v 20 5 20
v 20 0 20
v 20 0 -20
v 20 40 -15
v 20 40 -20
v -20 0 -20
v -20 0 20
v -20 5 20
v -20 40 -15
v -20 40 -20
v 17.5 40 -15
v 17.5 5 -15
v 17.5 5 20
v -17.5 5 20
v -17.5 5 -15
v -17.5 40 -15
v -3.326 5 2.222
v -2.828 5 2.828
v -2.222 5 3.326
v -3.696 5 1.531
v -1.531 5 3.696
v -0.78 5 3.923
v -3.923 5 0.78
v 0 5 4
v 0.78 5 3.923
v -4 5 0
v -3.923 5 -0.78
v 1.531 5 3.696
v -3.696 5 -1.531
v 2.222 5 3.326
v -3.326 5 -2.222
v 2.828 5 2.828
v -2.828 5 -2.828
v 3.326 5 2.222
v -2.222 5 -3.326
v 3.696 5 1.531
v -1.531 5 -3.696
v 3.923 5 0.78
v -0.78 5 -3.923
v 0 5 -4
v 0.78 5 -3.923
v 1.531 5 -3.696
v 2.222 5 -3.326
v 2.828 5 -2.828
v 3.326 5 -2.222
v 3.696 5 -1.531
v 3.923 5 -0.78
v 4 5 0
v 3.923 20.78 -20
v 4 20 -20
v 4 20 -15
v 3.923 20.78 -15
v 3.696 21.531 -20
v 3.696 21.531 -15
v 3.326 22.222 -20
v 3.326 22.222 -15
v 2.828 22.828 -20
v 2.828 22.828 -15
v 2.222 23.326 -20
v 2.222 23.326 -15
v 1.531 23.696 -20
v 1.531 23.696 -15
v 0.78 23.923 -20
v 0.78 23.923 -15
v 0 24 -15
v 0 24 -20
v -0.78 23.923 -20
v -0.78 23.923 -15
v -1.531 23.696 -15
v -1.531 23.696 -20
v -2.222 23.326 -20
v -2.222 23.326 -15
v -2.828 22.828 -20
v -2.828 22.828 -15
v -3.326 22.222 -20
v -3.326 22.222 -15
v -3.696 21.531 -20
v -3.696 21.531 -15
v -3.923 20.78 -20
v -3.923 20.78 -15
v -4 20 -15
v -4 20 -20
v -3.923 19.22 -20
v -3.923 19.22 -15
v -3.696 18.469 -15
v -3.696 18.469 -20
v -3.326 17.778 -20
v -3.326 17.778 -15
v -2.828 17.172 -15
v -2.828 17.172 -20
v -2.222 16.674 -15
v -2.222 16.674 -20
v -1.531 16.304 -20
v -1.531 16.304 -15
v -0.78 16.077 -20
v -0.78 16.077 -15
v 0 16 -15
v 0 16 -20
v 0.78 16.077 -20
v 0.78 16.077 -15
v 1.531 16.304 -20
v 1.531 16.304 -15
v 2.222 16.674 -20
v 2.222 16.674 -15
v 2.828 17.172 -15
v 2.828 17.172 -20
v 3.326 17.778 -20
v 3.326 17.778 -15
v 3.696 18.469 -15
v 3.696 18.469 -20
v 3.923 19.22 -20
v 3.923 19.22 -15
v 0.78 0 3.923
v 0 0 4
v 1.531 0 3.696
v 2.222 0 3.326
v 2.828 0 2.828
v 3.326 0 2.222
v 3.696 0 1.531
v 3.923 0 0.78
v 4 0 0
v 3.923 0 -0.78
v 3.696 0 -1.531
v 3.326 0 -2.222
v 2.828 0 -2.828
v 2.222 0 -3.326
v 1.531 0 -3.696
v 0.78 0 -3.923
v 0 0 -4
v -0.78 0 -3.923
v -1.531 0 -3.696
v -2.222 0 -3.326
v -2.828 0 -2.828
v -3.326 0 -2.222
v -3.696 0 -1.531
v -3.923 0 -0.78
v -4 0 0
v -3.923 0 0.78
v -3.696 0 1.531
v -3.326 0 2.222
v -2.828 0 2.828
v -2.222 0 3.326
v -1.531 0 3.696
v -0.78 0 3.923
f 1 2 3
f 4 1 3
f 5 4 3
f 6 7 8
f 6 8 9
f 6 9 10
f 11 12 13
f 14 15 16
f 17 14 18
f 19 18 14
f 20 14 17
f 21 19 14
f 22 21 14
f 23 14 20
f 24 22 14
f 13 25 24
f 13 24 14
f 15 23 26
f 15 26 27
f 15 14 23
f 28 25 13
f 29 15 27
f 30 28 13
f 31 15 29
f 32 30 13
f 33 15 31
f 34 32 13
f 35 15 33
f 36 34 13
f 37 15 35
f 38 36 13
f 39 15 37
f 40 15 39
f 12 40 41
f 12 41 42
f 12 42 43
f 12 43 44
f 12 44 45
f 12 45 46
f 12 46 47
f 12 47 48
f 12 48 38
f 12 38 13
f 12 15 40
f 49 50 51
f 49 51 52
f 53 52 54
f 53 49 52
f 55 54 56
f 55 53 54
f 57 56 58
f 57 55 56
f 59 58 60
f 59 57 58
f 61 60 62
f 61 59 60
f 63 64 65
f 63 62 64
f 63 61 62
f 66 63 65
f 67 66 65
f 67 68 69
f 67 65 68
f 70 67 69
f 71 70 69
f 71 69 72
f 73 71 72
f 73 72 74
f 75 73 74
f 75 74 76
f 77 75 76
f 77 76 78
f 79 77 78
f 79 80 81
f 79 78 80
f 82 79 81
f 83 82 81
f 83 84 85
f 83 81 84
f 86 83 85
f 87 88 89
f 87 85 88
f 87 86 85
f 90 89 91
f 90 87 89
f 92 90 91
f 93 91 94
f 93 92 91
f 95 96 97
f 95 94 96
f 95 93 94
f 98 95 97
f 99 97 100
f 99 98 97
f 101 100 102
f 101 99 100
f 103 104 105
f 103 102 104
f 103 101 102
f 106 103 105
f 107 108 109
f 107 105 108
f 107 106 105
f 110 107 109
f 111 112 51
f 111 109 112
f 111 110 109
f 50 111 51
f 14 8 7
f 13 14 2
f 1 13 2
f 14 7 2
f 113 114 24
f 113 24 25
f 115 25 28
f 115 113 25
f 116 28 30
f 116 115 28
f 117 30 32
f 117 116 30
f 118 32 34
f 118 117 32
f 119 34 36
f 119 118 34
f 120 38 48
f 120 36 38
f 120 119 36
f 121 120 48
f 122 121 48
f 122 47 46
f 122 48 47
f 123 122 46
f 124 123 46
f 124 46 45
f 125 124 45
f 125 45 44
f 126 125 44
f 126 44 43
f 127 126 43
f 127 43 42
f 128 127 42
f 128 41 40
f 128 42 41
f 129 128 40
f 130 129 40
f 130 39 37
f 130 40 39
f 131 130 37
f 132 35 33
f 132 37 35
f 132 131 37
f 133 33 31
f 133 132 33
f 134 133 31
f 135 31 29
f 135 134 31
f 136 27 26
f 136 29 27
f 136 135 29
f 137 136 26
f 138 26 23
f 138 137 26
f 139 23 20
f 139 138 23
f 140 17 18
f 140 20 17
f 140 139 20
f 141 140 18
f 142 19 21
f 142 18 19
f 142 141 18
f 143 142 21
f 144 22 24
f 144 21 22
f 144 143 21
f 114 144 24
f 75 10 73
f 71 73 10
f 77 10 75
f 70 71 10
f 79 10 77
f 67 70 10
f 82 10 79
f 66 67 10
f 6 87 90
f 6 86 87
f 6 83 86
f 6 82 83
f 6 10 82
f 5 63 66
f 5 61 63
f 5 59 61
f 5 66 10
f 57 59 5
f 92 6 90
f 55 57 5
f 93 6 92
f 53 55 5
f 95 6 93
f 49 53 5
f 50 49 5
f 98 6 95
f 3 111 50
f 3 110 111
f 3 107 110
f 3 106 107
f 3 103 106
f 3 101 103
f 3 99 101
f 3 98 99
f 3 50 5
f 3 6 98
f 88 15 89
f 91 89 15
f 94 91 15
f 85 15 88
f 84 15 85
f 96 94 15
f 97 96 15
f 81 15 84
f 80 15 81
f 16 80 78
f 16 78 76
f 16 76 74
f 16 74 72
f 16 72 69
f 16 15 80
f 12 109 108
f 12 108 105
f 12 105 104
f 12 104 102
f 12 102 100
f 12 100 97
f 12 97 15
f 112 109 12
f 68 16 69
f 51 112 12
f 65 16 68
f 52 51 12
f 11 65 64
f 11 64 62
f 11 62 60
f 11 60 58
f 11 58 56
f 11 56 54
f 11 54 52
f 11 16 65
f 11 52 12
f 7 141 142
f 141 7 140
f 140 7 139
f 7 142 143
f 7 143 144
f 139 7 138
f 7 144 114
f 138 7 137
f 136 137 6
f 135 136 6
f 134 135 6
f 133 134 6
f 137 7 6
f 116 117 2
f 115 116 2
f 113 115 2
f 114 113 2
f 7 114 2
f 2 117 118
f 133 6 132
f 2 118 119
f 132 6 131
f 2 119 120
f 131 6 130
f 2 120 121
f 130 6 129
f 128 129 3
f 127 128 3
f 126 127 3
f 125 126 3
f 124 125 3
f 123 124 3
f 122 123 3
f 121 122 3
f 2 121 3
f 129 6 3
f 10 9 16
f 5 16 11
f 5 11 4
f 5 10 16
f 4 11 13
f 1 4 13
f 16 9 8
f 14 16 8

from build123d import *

# Parameters (mm, degrees)
SKETCH1_W               = 40
SKETCH1_H               = 40
BOSS_EXTRUDE1_DEPTH     = 40
CUT_EXTRUDE1_DEPTH      = 61
CUT_EXTRUDE1_DEPTH_BACK = 61
CUT_EXTRUDE2_DEPTH      = 61
CUT_EXTRUDE2_DEPTH_BACK = 35
SKETCH4_W               = 35
SKETCH4_H               = 35
CUT_EXTRUDE3_DEPTH      = 57.789083458
CUT_EXTRUDE3_DEPTH_BACK = 57.789083458
SKETCH6_R               = 4
CUT_EXTRUDE4_DEPTH      = 46
CUT_EXTRUDE4_DEPTH_BACK = 46
SKETCH5_R               = 4


with BuildPart() as part:
    # Sketch1 → Boss-Extrude1 (new body)
    with BuildSketch(Plane(origin=(0, 0, 0), x_dir=(1, 0, 0), z_dir=(0, 1, 0))):
        Rectangle(SKETCH1_W, SKETCH1_H)
    extrude(amount=BOSS_EXTRUDE1_DEPTH)

    # Sketch2 → Cut-Extrude1 (cut, two sides: drawn at the far end of the back side and taken through both)
    with BuildSketch(Plane(origin=(20, 0, 0), x_dir=(0, 0, -1), z_dir=(1, 0, 0)).offset(-CUT_EXTRUDE1_DEPTH_BACK)):
        Polygon((15, 40), (-20, 5), (-20, 40), align=None)
    extrude(amount=CUT_EXTRUDE1_DEPTH + CUT_EXTRUDE1_DEPTH_BACK, mode=Mode.SUBTRACT)

    # Sketch4 → Cut-Extrude2 (cut, two sides: drawn at the far end of the back side and taken through both)
    with BuildSketch(Plane.XY.offset(20).offset(-CUT_EXTRUDE2_DEPTH_BACK)):
        with Locations((0, 22.5)):
            Rectangle(SKETCH4_W, SKETCH4_H)
    extrude(amount=CUT_EXTRUDE2_DEPTH + CUT_EXTRUDE2_DEPTH_BACK, mode=Mode.SUBTRACT)

    # Sketch6 → Cut-Extrude3 (cut, two sides: drawn at the far end of the back side and taken through both)
    with BuildSketch(Plane.XY.offset(-15).offset(-CUT_EXTRUDE3_DEPTH_BACK)):
        with Locations((0, 20)):
            Circle(SKETCH6_R)
    extrude(amount=CUT_EXTRUDE3_DEPTH + CUT_EXTRUDE3_DEPTH_BACK, mode=Mode.SUBTRACT)

    # Sketch5 → Cut-Extrude4 (cut, two sides: drawn at the far end of the back side and taken through both)
    with BuildSketch(Plane(origin=(0, 5, 0), x_dir=(1, 0, 0), z_dir=(0, 1, 0)).offset(-CUT_EXTRUDE4_DEPTH_BACK)):
        with Locations(Location((0, 0, 0), (0, 0, 270))):
            Circle(SKETCH5_R)
    extrude(amount=CUT_EXTRUDE4_DEPTH + CUT_EXTRUDE4_DEPTH_BACK, mode=Mode.SUBTRACT)


solid = part.part
